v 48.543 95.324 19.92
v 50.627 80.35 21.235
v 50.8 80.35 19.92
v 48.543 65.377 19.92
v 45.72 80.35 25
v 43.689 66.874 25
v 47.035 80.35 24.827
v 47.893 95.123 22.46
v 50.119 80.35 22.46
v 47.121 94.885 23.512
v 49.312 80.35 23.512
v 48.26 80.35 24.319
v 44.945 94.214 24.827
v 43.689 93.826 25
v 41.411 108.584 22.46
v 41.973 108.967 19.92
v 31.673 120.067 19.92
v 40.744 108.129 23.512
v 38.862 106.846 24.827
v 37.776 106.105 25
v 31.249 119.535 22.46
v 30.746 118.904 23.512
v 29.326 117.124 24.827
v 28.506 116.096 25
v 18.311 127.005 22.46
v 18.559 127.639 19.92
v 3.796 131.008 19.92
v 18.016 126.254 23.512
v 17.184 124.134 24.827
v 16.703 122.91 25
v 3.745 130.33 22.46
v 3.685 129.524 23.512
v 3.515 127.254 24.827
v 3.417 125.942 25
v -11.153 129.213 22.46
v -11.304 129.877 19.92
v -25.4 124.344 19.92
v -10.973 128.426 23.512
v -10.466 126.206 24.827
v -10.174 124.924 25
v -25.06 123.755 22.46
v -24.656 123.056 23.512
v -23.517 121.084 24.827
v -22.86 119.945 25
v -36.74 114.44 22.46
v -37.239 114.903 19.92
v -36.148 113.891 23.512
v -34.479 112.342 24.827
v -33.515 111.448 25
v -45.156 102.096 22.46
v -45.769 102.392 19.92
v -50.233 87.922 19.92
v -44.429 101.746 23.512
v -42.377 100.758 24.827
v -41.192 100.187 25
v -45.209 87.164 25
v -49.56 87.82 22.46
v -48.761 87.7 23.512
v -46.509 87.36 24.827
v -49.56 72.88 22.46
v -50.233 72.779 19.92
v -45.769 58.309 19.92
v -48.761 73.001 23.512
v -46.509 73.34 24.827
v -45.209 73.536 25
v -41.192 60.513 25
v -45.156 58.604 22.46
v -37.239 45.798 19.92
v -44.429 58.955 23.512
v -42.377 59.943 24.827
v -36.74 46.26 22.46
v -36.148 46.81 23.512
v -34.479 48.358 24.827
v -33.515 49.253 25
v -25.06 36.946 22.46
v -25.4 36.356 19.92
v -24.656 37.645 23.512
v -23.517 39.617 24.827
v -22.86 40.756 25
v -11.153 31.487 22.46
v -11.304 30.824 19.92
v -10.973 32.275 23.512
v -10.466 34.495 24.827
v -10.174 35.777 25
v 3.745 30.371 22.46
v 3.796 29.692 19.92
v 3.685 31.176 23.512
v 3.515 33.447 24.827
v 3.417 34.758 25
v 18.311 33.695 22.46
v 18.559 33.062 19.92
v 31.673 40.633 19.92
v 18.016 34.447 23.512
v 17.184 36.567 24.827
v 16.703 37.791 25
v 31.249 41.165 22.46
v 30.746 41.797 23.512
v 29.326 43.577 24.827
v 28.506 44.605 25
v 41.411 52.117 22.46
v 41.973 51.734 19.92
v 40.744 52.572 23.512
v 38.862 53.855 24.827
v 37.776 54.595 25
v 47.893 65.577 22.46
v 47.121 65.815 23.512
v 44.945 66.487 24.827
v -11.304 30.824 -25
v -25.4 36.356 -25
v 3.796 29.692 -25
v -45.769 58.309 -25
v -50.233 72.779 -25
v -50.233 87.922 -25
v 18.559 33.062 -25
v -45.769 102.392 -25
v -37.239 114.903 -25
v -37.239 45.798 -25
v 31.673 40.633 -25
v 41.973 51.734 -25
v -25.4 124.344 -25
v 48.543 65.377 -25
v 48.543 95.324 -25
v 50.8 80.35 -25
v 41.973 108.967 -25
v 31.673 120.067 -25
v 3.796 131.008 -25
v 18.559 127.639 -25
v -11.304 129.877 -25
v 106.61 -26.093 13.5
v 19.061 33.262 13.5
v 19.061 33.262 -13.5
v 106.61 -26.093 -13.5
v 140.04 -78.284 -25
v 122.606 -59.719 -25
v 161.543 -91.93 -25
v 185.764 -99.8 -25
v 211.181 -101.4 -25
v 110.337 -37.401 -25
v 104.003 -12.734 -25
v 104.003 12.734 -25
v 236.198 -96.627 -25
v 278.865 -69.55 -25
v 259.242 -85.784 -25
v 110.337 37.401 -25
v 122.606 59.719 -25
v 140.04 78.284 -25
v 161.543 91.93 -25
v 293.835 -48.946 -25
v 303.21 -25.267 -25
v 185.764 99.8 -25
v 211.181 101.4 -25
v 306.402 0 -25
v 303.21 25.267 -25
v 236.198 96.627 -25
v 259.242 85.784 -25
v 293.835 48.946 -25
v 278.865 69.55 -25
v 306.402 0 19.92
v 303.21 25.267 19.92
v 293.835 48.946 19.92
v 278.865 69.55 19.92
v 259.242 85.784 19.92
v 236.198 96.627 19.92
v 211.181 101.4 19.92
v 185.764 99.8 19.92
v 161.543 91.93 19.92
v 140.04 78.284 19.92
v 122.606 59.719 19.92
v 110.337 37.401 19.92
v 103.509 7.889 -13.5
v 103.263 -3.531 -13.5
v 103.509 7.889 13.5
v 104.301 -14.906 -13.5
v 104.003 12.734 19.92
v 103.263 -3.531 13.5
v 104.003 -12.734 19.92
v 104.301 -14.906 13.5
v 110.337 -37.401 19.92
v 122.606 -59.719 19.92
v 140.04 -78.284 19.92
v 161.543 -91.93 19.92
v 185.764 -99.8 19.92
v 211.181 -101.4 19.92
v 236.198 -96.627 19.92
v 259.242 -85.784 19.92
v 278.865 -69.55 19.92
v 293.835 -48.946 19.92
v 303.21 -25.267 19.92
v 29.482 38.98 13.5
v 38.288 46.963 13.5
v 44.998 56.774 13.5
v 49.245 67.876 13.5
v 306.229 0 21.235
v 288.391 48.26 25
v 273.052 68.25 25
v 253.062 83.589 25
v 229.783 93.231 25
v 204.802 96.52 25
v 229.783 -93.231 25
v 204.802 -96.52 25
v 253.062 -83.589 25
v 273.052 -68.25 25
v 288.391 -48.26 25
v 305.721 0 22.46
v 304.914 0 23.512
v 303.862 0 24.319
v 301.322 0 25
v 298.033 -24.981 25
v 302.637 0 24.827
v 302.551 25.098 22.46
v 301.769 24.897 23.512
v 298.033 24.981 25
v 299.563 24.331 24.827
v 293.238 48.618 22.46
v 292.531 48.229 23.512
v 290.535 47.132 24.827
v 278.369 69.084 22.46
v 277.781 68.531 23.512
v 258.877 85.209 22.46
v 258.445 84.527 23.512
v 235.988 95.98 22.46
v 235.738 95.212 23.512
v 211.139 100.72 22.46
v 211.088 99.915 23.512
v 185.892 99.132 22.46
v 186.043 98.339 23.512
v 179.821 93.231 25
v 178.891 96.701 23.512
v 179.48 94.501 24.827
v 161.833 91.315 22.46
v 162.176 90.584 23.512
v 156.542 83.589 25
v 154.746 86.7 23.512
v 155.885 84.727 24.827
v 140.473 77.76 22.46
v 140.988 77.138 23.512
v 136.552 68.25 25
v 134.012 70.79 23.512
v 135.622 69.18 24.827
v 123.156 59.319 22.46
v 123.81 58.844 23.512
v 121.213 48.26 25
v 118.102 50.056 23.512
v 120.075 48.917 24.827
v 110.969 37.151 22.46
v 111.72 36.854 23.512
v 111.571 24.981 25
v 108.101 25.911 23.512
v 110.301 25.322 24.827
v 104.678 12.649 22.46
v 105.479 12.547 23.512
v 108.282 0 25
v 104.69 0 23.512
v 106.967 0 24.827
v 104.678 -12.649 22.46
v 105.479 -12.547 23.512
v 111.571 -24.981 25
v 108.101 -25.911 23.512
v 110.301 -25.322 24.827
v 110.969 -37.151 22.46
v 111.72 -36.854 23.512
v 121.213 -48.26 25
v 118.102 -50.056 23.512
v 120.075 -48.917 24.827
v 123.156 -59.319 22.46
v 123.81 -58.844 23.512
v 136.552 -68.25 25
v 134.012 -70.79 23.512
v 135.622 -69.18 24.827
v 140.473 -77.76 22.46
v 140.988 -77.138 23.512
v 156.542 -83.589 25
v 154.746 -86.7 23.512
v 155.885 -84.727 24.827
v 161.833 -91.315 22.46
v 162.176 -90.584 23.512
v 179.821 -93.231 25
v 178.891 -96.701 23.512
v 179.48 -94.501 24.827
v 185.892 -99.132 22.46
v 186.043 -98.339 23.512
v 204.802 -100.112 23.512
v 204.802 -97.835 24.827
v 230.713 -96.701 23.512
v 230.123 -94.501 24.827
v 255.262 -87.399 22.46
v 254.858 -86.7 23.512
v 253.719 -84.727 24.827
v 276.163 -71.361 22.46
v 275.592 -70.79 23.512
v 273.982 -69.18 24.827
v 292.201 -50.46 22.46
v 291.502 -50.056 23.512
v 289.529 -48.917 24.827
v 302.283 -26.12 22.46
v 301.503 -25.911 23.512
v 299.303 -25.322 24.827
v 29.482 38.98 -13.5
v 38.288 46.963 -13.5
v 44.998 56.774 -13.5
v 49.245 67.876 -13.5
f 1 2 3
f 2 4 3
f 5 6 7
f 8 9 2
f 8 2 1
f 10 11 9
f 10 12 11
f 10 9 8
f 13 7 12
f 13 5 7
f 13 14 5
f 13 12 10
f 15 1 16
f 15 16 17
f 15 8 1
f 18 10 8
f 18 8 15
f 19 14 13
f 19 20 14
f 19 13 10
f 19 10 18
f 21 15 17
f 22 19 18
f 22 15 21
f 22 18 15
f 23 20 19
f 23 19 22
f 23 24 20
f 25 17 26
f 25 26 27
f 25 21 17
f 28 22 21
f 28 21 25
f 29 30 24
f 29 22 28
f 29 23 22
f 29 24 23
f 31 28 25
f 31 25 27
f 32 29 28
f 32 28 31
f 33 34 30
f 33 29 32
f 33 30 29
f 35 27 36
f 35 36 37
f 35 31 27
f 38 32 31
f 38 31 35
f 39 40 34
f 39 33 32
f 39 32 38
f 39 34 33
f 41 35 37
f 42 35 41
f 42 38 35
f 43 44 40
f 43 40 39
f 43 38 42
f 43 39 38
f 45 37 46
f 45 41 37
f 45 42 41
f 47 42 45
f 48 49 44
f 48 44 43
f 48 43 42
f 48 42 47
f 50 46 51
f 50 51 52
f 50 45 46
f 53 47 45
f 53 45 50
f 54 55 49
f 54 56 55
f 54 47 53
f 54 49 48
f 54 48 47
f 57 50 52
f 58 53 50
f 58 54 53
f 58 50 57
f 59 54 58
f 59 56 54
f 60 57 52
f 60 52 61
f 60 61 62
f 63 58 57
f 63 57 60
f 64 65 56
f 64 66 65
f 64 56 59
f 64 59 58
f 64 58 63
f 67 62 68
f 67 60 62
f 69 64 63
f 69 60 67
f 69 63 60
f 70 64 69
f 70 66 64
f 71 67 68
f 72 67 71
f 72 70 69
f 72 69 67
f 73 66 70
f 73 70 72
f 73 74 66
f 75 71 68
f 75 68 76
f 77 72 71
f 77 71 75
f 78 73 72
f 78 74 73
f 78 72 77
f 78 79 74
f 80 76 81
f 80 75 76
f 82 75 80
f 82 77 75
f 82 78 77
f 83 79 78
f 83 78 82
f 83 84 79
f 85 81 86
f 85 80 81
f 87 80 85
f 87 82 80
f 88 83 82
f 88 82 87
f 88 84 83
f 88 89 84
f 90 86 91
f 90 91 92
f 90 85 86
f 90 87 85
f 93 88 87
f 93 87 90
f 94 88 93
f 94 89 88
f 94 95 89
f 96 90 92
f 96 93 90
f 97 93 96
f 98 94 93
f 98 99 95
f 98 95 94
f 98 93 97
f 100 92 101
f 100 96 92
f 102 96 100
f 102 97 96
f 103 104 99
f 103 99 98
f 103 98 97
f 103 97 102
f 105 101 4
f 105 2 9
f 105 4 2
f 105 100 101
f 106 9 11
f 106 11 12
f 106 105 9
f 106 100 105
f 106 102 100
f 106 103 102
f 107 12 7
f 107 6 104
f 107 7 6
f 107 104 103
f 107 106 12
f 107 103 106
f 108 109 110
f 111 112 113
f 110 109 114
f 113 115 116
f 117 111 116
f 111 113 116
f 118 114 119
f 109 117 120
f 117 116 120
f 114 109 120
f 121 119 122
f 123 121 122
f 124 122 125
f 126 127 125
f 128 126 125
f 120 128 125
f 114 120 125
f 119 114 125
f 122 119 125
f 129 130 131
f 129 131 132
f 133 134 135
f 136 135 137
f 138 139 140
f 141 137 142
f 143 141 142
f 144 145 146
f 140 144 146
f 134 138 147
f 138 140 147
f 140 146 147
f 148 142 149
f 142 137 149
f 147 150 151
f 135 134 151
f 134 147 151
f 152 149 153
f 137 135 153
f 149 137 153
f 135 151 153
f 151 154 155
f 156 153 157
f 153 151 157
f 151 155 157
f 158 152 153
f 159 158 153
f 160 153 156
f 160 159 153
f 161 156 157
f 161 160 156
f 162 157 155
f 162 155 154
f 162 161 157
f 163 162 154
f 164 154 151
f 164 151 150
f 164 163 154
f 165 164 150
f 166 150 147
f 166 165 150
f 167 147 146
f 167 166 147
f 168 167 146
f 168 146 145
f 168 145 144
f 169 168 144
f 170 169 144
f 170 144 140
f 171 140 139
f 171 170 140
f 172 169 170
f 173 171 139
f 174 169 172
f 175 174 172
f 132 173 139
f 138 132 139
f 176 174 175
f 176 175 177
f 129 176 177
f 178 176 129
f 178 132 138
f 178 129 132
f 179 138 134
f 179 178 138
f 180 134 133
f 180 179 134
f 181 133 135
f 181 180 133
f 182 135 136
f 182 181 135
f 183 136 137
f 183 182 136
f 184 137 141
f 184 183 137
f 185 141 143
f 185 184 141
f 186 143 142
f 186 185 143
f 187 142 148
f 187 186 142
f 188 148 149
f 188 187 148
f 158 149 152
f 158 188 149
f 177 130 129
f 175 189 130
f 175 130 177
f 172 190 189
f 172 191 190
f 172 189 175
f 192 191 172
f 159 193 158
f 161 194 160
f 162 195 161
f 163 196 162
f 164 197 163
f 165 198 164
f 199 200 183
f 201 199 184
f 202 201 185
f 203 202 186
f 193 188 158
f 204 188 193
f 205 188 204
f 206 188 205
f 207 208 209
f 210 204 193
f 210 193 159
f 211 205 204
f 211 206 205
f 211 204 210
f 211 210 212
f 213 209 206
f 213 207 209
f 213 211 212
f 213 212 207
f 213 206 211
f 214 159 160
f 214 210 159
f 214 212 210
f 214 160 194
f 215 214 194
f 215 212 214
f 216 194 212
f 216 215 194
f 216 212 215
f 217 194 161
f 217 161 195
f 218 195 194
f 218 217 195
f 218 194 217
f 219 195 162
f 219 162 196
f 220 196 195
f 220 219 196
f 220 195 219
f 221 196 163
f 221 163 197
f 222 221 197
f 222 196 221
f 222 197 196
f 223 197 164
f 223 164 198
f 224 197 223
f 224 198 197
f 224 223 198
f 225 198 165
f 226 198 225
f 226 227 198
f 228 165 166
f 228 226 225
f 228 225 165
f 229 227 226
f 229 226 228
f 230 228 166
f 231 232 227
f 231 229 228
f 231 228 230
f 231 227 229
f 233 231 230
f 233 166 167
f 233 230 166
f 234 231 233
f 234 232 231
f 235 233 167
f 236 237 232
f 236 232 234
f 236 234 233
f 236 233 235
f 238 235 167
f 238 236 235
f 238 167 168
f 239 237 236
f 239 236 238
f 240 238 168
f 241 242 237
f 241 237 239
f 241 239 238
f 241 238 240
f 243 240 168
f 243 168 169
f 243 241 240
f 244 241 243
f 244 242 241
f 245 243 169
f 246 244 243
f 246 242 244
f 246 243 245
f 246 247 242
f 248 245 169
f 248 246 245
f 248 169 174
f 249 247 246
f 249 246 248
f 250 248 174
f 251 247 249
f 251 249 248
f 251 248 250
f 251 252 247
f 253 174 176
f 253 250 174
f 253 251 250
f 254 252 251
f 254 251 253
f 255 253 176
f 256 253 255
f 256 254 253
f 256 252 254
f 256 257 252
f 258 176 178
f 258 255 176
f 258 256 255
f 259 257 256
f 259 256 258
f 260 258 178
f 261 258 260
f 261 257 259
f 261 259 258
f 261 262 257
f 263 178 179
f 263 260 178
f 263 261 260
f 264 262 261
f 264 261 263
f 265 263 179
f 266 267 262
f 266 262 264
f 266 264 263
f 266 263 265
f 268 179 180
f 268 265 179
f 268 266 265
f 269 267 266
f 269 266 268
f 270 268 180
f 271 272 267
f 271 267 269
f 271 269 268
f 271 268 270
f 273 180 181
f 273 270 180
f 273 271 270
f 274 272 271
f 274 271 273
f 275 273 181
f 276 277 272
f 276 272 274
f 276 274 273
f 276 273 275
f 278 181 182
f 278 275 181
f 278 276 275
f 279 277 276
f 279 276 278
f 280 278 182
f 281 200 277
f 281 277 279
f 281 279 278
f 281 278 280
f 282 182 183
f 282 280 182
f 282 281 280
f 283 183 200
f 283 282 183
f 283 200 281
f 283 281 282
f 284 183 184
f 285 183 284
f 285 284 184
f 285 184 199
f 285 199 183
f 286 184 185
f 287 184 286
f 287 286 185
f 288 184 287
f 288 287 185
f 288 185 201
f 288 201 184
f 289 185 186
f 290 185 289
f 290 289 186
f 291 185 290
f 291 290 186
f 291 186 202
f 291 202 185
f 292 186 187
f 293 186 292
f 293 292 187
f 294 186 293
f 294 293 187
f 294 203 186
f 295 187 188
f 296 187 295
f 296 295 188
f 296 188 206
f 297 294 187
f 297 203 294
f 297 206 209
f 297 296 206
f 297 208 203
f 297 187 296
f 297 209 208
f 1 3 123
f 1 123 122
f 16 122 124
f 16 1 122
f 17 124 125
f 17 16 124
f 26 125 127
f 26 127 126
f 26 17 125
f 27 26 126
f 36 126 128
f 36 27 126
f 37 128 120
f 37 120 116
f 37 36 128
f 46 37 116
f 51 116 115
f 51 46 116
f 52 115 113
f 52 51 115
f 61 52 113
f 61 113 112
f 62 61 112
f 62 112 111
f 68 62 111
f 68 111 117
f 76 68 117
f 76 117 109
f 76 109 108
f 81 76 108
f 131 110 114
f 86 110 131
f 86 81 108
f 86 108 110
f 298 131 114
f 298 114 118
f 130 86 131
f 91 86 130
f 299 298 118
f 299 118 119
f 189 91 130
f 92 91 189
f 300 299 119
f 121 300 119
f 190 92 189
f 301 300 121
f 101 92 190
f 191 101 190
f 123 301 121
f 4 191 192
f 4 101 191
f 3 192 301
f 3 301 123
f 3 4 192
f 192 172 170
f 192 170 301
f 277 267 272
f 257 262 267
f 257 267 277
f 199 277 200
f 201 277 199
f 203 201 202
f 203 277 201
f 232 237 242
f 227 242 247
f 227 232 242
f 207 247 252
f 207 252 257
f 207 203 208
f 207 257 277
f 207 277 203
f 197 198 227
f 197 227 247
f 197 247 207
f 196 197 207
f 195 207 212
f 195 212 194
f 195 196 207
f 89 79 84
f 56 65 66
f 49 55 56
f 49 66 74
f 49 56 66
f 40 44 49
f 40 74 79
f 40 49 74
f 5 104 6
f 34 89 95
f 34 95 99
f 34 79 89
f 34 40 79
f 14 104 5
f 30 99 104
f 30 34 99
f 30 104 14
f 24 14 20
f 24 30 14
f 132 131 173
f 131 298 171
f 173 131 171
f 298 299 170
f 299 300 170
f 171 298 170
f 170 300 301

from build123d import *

# Parameters (mm, degrees)
F0_R     = 101.6
F0_R_2   = 50.8
F1_DEPTH = 25
F2_R     = 5.08
F4_DEPTH = 13.5


with BuildPart() as f1:
    # F0 (on Top) → F1 (new body, symmetric)
    with BuildSketch(Plane.XY):
        with Locations((204.801934, 0)):
            Circle(F0_R)
        with Locations((0, 80.350283)):
            Circle(F0_R_2)
    extrude(amount=F1_DEPTH, both=True)

    # F2
    f2_edges = [f1.edges().sort_by_distance(p)[0] for p in [
        (-50.8, 80.350283, 25),
        (103.201934, 0, 25),
    ]]
    fillet(f2_edges, radius=F2_R)

    # F3 (on Top) → F4 (join, symmetric)
    with BuildSketch(Plane.XY):
        Polygon((10.487304, 110.720679), (17.449906, 34.354378), (178.083748, -74.550241), align=None)
    extrude(amount=F4_DEPTH, both=True)


solid = f1.part
